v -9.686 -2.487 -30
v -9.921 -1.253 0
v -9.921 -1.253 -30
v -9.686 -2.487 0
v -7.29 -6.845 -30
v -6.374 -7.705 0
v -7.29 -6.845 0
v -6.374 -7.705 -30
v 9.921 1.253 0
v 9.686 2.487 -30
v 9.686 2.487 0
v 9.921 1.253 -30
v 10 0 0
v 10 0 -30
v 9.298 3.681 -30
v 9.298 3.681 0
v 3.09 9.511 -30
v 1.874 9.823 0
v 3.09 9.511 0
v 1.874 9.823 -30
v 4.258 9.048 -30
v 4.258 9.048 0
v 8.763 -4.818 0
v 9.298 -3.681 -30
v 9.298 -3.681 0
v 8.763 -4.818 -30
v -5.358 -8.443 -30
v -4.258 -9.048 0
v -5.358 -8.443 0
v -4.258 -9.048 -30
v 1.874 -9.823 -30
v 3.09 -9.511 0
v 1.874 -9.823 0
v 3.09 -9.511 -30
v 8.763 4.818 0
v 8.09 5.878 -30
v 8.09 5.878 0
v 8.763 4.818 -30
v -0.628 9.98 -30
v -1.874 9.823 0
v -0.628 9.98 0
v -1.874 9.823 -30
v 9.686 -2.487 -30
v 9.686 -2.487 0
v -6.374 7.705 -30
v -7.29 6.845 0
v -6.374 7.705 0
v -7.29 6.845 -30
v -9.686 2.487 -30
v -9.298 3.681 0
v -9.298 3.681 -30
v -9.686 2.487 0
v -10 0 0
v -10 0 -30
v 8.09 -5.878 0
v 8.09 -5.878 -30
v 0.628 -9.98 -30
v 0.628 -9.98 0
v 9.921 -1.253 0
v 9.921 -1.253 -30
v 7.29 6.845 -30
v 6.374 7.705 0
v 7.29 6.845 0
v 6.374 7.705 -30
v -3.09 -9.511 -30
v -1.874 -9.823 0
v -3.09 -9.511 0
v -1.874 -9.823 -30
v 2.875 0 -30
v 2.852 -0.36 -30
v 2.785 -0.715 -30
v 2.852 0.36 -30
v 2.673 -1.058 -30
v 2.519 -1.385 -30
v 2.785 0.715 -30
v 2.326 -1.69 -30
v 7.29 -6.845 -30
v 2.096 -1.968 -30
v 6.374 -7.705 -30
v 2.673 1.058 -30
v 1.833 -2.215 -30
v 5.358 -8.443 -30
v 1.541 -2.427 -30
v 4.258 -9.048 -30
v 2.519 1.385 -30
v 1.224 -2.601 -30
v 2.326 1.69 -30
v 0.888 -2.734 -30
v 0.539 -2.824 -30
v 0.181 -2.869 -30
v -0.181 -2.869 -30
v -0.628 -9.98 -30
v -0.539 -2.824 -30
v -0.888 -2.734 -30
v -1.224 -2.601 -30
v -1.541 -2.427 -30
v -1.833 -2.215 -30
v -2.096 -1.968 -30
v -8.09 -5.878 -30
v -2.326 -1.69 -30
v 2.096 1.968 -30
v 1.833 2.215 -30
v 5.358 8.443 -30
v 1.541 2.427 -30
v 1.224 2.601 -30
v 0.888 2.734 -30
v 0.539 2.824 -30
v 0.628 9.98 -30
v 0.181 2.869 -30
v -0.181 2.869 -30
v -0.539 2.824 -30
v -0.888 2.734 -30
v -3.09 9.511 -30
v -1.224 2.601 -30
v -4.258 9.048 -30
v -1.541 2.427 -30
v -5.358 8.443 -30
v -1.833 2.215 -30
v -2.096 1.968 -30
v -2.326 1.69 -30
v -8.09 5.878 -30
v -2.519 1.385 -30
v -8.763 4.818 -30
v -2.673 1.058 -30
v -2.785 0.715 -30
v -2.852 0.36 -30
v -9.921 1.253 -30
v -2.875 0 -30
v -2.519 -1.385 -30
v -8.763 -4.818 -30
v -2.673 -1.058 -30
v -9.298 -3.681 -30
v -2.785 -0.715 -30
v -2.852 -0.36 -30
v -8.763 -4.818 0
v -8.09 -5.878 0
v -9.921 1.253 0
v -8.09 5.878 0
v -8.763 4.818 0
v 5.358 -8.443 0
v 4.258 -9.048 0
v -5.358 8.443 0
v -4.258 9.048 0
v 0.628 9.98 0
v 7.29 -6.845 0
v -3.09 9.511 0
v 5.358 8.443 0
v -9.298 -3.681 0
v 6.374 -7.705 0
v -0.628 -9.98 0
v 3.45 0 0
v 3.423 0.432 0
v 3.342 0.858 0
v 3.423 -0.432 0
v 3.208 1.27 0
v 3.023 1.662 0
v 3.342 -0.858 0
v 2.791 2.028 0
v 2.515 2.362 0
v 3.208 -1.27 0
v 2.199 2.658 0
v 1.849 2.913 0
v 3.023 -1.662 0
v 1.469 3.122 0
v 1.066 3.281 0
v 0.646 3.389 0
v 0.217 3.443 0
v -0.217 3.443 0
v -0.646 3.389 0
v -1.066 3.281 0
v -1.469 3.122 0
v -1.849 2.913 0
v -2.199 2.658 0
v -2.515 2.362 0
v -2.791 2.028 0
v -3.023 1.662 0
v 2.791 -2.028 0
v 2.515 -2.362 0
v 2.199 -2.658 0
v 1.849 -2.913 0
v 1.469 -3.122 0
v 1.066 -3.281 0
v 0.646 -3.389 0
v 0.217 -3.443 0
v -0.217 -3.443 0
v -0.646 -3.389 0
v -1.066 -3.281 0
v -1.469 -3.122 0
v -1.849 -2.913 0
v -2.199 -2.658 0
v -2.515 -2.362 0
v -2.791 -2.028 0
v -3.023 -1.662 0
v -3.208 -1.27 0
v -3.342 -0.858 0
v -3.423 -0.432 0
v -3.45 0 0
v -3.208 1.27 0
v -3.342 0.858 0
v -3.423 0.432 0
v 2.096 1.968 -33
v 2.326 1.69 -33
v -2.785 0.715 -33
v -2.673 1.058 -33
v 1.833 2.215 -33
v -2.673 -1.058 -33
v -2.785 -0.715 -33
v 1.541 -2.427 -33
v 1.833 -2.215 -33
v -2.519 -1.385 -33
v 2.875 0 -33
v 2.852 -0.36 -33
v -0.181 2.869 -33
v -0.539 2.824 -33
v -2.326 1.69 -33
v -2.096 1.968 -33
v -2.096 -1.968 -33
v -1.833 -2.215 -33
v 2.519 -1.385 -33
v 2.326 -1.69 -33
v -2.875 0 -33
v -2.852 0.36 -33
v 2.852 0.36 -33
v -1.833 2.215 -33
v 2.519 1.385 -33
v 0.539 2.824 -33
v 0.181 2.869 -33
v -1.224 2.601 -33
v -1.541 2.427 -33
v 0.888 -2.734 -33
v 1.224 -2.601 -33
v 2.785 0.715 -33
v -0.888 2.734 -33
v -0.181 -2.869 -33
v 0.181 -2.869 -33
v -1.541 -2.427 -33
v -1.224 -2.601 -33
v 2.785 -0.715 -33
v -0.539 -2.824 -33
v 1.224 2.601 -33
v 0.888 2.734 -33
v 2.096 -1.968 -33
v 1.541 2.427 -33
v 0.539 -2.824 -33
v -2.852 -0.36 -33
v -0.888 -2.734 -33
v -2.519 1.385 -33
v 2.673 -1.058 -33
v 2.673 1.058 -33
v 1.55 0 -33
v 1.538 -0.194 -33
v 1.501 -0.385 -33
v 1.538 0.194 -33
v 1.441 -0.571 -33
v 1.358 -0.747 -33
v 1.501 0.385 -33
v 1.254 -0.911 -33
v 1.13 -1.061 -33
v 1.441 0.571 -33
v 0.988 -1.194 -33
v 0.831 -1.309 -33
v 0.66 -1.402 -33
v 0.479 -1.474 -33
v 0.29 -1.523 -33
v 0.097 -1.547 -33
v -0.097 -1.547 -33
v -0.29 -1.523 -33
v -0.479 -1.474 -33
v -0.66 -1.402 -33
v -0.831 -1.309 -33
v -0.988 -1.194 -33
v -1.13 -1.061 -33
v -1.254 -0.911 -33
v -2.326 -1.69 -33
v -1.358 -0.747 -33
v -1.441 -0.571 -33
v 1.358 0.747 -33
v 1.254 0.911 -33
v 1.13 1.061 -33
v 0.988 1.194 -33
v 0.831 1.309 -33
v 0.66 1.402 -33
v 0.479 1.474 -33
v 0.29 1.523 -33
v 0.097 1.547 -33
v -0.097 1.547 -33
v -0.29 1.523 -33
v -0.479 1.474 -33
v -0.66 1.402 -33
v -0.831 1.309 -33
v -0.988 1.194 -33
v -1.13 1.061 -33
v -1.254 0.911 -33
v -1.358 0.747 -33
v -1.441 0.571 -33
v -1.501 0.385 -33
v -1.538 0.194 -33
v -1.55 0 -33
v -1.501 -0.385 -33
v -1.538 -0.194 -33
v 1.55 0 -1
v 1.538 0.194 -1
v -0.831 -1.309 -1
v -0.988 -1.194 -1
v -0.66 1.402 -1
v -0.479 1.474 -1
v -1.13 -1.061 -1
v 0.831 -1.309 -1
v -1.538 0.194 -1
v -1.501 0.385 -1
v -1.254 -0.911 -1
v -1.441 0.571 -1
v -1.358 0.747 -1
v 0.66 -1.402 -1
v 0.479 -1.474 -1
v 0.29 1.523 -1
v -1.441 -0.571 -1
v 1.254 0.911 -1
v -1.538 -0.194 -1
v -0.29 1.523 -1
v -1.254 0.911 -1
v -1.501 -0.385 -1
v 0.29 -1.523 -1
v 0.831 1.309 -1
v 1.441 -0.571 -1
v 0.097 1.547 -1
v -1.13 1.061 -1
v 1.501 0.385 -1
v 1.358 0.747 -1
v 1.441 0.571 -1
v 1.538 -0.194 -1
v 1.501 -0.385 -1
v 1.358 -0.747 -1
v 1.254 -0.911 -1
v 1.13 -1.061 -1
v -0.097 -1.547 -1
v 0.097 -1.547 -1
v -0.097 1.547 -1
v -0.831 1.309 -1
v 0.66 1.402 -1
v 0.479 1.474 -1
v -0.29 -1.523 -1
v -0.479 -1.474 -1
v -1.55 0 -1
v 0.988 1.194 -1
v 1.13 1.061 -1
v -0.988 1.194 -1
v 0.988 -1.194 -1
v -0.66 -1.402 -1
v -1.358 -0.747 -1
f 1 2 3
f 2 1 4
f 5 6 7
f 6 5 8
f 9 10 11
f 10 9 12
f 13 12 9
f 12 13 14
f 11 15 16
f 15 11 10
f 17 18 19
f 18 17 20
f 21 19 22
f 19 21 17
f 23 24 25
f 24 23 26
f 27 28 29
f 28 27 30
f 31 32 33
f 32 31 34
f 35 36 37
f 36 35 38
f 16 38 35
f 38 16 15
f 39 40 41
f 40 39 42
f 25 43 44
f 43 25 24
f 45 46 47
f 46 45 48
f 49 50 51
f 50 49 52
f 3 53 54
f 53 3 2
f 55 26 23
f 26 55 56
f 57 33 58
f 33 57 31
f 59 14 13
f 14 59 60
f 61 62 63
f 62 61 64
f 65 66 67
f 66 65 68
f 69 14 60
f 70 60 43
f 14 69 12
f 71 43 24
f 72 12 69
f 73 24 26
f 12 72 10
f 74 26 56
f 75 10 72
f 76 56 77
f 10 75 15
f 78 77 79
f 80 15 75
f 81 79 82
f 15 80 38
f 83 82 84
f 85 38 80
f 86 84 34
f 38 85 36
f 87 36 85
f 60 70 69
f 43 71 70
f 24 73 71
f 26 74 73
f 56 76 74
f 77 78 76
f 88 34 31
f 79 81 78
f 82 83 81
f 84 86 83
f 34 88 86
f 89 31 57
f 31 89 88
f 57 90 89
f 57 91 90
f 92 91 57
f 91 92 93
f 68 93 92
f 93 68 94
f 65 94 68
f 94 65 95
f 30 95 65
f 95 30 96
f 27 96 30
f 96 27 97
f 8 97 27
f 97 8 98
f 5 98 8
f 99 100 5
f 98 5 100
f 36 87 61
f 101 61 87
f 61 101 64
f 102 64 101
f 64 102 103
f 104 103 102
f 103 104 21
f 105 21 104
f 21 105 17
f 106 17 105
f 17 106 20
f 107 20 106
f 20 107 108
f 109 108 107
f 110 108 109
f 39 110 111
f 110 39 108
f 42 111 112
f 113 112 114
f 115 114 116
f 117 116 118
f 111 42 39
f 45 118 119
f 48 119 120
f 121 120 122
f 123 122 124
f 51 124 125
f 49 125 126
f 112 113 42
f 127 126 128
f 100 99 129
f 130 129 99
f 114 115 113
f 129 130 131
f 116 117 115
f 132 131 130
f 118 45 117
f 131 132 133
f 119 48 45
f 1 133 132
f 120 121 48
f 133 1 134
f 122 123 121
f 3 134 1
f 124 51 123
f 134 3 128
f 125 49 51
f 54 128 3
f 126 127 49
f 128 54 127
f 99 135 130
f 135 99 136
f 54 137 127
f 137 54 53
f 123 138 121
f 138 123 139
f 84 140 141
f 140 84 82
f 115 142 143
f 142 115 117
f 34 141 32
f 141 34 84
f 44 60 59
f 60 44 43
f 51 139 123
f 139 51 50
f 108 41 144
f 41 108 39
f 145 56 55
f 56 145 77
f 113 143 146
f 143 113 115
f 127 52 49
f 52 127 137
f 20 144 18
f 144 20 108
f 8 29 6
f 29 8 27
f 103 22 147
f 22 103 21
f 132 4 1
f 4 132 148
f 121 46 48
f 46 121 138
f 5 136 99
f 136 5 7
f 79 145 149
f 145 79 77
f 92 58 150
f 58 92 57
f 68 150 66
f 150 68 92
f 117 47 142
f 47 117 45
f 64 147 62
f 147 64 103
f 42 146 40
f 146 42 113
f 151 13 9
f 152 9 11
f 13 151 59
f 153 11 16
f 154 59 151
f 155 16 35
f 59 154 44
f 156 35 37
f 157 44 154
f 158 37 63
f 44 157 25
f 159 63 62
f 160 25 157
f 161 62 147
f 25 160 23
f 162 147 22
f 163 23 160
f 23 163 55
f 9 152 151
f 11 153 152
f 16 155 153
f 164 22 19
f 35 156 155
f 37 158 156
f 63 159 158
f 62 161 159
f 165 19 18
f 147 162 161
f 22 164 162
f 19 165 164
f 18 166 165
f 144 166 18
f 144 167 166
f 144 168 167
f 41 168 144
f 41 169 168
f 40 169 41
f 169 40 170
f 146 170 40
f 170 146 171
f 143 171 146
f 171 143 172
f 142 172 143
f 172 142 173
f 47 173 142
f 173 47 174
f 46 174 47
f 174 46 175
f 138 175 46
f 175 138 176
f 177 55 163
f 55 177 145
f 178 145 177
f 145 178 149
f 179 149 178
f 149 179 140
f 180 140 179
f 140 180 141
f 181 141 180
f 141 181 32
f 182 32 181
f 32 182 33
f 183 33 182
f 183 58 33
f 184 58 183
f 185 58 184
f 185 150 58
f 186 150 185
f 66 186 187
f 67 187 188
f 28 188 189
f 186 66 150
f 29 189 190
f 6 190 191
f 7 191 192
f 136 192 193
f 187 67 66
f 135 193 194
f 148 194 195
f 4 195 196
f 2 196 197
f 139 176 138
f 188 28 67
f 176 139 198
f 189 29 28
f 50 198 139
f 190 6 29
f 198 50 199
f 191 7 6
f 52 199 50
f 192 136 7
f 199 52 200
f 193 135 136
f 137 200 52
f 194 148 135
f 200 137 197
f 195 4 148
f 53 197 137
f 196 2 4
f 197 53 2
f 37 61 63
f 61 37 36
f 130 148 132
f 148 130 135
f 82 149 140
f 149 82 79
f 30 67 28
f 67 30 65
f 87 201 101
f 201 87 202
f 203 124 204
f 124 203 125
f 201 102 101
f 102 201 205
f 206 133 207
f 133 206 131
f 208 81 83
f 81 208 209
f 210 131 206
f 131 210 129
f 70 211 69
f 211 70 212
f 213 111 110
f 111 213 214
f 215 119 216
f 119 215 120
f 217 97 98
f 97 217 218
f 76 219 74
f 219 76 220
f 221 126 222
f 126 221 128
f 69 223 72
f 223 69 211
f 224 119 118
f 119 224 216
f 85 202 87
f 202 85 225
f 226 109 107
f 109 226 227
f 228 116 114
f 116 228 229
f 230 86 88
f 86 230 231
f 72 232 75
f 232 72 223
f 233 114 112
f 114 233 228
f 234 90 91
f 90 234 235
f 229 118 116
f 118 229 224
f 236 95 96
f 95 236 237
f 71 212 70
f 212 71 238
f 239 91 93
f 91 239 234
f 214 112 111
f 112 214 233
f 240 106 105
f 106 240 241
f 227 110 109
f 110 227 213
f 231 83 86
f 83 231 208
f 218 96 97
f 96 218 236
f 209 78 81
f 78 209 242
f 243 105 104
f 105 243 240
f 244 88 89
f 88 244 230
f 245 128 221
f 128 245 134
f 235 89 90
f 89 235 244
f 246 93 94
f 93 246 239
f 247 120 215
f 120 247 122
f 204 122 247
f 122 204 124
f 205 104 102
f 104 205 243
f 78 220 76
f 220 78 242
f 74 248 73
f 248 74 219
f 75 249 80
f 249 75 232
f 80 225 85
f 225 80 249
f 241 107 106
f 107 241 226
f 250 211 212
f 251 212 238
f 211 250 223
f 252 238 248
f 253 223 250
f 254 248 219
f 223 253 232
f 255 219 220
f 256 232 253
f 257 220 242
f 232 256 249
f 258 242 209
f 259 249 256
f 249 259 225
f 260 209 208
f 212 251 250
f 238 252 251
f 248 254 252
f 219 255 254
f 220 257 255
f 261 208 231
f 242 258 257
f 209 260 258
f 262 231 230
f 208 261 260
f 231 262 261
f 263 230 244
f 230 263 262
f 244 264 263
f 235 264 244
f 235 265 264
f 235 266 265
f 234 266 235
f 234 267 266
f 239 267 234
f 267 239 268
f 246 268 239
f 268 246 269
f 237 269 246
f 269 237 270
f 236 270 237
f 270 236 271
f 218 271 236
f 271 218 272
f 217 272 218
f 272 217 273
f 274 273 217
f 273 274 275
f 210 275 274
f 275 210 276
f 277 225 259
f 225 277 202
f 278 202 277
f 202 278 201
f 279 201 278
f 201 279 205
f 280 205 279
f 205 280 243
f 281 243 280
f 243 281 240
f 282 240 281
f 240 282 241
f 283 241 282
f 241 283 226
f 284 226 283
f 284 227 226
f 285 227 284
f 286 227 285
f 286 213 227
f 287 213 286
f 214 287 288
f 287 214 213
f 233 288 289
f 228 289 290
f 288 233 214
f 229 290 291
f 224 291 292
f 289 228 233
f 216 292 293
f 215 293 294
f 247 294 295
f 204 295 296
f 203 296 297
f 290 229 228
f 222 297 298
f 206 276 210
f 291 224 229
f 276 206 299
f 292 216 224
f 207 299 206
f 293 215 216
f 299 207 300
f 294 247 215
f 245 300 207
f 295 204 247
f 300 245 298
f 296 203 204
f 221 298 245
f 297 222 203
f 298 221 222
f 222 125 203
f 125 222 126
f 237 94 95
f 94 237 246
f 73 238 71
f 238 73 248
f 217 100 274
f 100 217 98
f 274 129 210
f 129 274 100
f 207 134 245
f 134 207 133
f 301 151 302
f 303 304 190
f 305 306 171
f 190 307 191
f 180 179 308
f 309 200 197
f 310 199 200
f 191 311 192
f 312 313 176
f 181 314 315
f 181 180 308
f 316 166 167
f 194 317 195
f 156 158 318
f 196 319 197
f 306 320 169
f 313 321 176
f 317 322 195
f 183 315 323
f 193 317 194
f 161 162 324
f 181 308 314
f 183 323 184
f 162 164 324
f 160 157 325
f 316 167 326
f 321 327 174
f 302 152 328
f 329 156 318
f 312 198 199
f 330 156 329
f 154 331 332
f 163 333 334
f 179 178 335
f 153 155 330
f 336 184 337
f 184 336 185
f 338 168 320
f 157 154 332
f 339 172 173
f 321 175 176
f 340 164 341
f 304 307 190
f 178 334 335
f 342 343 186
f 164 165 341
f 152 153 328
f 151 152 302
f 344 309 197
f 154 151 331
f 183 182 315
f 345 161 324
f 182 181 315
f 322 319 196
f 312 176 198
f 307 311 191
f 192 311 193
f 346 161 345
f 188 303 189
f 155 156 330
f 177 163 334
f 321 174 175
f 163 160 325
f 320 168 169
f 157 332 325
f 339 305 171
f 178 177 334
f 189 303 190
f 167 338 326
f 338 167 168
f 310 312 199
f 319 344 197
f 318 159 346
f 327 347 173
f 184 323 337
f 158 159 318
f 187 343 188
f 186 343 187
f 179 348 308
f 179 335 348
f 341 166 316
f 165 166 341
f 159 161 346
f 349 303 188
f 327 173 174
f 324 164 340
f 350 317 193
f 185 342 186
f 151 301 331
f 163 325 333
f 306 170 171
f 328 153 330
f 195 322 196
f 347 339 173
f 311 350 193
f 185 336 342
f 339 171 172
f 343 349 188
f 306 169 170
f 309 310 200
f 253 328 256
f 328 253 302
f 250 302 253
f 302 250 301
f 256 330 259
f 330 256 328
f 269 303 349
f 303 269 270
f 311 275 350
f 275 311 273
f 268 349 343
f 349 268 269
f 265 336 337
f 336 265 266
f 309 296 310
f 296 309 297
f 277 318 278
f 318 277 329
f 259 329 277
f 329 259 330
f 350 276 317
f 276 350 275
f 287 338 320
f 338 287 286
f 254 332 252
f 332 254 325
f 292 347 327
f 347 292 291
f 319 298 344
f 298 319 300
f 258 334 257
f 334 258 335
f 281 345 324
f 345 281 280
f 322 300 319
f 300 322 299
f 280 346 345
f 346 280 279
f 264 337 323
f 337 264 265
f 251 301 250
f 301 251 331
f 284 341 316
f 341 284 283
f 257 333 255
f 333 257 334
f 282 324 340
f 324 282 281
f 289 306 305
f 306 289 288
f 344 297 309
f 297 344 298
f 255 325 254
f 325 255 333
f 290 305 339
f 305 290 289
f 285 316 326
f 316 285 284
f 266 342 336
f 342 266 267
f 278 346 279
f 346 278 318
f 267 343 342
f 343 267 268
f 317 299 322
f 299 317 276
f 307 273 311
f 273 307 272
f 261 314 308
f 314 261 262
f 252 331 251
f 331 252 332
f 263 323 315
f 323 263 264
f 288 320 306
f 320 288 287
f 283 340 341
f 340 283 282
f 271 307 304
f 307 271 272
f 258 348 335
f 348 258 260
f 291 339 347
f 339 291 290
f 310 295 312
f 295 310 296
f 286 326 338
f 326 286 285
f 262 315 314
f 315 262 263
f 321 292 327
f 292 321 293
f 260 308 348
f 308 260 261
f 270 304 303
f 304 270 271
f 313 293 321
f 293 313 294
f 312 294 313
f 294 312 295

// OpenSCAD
$fn = 50;

difference() {
	union() {
		translate(v = [0, 0, -30.0]) {
			cylinder(h = 30, r = 10.0);
		}
		#translate(v = [0, 0, -33.0]) {
			cylinder(h = 33, r = 2.875);
		}
	}
	union() {
		translate(v = [0, 0, 0]) {
			rotate(a = [0, 0, 0]) {
				difference() {
					union() {
						translate(v = [0, 0, -33.0]) {
							cylinder(h = 33, r = 1.25);
						}
						translate(v = [0, 0, -1.0]) {
							cylinder(h = 1.0, r1 = 1.55, r2 = 3.45);
						}
						translate(v = [0, 0, -33.0]) {
							cylinder(h = 33, r = 1.55);
						}
						translate(v = [0, 0, -33.0]) {
							cylinder(h = 33, r = 1.25);
						}
					}
					union();
				}
			}
		}
	}
}
